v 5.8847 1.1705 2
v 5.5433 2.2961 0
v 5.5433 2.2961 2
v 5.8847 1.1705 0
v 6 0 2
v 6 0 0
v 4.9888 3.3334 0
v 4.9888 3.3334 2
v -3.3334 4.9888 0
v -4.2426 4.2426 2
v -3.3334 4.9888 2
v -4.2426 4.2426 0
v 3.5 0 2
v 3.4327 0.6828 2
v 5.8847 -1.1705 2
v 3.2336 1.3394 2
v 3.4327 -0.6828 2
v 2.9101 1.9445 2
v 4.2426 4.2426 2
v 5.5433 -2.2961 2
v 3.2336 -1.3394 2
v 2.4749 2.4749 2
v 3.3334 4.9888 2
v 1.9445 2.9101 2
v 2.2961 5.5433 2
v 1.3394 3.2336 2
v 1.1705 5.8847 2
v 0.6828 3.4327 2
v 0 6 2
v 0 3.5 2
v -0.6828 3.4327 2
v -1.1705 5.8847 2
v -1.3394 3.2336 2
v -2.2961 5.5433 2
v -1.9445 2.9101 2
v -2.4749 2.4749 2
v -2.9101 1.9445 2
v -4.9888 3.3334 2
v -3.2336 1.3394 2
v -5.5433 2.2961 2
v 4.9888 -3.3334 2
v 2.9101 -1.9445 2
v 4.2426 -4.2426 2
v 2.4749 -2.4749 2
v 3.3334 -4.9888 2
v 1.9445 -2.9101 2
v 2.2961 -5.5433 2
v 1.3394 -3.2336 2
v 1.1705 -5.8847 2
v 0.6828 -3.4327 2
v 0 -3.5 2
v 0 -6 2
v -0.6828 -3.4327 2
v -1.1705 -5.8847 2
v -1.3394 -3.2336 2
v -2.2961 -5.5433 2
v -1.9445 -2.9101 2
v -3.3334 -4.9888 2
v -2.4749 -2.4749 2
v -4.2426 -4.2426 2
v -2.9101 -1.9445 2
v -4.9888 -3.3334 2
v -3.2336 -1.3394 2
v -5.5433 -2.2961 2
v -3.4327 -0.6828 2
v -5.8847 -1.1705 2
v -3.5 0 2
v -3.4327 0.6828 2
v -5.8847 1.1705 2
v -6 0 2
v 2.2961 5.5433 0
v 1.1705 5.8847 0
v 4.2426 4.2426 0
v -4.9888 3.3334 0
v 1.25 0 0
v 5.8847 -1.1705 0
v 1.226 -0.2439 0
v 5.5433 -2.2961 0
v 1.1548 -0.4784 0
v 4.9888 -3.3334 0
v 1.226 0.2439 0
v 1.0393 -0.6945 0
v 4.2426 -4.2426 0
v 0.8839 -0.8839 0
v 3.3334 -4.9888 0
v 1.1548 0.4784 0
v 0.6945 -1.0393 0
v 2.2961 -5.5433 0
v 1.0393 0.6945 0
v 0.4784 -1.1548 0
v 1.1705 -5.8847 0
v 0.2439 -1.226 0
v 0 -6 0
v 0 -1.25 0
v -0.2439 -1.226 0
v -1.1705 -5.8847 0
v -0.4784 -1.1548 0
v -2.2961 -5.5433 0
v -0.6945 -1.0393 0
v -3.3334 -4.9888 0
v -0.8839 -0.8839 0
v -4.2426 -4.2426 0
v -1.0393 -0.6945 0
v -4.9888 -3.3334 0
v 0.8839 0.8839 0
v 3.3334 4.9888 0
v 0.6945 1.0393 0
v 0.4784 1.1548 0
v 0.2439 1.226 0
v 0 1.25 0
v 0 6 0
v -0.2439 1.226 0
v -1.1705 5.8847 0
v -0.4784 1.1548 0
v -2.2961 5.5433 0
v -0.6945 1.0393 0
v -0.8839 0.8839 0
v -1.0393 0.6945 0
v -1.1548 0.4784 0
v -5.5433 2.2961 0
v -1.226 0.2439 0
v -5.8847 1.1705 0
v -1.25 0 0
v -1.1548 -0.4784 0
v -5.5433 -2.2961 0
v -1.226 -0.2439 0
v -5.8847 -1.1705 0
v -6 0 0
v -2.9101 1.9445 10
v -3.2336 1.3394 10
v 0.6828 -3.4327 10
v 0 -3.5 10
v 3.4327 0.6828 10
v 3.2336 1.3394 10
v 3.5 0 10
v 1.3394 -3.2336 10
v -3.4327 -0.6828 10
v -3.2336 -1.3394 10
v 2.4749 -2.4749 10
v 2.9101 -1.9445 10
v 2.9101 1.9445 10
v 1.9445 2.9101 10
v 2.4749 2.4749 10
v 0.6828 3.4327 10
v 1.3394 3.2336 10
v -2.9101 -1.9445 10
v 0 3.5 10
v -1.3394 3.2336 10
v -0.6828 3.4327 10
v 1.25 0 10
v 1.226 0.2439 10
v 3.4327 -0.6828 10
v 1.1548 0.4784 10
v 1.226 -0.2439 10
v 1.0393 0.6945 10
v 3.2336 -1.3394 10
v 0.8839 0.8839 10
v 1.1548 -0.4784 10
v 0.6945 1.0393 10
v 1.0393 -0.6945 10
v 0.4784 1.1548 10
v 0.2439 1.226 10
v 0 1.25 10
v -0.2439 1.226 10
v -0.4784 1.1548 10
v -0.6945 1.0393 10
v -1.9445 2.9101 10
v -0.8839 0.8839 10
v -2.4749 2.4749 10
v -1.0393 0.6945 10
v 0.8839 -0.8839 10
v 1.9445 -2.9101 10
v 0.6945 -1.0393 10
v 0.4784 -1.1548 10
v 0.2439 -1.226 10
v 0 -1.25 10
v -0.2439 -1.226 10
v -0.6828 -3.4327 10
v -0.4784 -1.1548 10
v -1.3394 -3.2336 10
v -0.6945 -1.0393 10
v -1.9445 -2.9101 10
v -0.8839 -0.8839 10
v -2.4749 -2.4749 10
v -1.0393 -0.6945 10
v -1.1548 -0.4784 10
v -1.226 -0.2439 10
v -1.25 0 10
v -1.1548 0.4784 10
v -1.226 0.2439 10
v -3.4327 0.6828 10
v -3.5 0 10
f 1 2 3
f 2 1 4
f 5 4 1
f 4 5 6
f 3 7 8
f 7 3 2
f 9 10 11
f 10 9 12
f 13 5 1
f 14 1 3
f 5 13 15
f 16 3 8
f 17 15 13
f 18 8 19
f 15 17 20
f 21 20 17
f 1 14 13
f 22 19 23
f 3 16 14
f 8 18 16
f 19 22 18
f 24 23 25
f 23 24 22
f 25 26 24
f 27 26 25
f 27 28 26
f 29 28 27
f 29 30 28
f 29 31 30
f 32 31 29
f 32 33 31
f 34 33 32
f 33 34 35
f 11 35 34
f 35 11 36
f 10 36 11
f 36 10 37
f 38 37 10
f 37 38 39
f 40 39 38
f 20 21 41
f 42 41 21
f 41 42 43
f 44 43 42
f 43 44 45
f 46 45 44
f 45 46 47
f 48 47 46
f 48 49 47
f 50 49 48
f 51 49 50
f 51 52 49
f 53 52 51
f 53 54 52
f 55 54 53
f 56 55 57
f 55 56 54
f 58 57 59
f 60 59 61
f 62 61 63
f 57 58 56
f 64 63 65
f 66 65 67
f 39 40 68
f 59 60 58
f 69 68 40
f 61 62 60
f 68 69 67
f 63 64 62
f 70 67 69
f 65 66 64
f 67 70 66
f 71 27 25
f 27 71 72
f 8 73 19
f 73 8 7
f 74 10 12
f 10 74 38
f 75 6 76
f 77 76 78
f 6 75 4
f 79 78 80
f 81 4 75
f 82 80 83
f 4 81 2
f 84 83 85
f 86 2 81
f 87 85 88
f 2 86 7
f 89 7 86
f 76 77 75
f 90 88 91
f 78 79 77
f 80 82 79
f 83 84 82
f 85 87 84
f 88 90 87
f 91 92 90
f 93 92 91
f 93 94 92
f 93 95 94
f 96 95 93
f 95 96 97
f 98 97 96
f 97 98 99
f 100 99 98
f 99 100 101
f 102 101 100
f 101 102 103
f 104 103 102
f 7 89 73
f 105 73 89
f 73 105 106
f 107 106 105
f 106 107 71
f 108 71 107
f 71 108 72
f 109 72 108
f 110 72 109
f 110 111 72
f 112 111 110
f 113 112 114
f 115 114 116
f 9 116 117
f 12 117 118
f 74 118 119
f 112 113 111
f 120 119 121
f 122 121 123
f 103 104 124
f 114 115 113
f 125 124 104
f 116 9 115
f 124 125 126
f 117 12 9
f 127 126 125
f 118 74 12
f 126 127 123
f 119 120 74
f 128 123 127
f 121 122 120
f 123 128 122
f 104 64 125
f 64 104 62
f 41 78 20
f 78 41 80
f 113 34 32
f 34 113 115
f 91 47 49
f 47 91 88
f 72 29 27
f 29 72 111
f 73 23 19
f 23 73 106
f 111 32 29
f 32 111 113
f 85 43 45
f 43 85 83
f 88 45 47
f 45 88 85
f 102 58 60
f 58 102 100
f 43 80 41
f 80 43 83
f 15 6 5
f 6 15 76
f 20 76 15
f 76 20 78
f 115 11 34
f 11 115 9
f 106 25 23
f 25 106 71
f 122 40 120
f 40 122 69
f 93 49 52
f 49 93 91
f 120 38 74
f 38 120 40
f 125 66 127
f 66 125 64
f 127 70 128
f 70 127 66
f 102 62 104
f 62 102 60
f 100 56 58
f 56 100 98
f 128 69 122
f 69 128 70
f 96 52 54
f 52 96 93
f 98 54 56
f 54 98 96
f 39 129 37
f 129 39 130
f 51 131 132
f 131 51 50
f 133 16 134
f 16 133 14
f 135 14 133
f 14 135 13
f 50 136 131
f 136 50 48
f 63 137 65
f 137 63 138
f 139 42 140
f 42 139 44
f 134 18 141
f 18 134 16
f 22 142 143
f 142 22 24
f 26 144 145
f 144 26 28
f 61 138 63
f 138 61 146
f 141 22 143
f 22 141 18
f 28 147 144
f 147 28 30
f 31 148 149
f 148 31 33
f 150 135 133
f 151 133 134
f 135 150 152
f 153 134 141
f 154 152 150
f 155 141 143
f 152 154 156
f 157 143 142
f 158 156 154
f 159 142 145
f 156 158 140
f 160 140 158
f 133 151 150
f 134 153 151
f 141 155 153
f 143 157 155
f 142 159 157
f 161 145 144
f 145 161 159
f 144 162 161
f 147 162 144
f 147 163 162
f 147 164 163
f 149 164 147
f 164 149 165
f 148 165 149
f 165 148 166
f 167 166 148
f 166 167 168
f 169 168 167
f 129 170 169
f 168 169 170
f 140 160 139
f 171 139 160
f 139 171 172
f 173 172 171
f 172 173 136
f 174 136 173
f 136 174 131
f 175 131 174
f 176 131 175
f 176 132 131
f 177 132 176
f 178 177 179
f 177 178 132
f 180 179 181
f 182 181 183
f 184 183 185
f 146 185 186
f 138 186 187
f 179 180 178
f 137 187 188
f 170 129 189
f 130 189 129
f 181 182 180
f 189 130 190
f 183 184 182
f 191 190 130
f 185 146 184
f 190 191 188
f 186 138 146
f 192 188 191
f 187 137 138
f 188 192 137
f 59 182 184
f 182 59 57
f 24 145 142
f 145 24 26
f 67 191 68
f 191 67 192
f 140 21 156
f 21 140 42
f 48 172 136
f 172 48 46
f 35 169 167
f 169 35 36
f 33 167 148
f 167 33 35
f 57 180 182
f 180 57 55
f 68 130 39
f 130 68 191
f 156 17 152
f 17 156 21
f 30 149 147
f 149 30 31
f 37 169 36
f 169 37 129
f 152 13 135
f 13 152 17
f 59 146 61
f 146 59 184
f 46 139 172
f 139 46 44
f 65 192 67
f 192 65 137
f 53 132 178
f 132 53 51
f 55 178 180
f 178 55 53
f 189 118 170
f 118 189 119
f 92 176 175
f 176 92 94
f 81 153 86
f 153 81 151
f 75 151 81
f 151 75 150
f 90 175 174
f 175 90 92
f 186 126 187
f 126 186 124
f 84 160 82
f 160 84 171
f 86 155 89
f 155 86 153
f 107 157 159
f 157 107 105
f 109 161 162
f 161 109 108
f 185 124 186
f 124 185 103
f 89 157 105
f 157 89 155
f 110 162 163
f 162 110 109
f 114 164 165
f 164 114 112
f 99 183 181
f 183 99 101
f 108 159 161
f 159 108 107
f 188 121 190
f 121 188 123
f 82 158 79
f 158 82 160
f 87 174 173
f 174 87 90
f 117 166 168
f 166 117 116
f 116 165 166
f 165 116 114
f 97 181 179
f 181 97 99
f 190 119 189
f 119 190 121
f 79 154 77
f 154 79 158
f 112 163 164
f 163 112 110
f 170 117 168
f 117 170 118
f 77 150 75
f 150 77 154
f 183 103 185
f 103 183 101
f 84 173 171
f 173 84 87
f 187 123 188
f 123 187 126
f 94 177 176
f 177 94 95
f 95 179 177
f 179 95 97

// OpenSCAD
$fn = 32;

// ----------------------------------------------------------------------
// Micro post: flanged post, 5-20 mm class
// ----------------------------------------------------------------------

// --- parameters (mm) ---
post_d = 7;               // post diameter
post_h = 8;               // post height above the flange
flange_d = 12;            // flange diameter
flange_t = 2;             // flange thickness
bore_d = 2.5;             // through bore

total_h = post_h + flange_t;  // overall height

difference() {
  union() {
    cylinder(h = flange_t, d = flange_d);
    translate([0, 0, flange_t]) cylinder(h = post_h, d = post_d);
  }
  translate([0, 0, -1]) cylinder(h = total_h + 2, d = bore_d);
}
